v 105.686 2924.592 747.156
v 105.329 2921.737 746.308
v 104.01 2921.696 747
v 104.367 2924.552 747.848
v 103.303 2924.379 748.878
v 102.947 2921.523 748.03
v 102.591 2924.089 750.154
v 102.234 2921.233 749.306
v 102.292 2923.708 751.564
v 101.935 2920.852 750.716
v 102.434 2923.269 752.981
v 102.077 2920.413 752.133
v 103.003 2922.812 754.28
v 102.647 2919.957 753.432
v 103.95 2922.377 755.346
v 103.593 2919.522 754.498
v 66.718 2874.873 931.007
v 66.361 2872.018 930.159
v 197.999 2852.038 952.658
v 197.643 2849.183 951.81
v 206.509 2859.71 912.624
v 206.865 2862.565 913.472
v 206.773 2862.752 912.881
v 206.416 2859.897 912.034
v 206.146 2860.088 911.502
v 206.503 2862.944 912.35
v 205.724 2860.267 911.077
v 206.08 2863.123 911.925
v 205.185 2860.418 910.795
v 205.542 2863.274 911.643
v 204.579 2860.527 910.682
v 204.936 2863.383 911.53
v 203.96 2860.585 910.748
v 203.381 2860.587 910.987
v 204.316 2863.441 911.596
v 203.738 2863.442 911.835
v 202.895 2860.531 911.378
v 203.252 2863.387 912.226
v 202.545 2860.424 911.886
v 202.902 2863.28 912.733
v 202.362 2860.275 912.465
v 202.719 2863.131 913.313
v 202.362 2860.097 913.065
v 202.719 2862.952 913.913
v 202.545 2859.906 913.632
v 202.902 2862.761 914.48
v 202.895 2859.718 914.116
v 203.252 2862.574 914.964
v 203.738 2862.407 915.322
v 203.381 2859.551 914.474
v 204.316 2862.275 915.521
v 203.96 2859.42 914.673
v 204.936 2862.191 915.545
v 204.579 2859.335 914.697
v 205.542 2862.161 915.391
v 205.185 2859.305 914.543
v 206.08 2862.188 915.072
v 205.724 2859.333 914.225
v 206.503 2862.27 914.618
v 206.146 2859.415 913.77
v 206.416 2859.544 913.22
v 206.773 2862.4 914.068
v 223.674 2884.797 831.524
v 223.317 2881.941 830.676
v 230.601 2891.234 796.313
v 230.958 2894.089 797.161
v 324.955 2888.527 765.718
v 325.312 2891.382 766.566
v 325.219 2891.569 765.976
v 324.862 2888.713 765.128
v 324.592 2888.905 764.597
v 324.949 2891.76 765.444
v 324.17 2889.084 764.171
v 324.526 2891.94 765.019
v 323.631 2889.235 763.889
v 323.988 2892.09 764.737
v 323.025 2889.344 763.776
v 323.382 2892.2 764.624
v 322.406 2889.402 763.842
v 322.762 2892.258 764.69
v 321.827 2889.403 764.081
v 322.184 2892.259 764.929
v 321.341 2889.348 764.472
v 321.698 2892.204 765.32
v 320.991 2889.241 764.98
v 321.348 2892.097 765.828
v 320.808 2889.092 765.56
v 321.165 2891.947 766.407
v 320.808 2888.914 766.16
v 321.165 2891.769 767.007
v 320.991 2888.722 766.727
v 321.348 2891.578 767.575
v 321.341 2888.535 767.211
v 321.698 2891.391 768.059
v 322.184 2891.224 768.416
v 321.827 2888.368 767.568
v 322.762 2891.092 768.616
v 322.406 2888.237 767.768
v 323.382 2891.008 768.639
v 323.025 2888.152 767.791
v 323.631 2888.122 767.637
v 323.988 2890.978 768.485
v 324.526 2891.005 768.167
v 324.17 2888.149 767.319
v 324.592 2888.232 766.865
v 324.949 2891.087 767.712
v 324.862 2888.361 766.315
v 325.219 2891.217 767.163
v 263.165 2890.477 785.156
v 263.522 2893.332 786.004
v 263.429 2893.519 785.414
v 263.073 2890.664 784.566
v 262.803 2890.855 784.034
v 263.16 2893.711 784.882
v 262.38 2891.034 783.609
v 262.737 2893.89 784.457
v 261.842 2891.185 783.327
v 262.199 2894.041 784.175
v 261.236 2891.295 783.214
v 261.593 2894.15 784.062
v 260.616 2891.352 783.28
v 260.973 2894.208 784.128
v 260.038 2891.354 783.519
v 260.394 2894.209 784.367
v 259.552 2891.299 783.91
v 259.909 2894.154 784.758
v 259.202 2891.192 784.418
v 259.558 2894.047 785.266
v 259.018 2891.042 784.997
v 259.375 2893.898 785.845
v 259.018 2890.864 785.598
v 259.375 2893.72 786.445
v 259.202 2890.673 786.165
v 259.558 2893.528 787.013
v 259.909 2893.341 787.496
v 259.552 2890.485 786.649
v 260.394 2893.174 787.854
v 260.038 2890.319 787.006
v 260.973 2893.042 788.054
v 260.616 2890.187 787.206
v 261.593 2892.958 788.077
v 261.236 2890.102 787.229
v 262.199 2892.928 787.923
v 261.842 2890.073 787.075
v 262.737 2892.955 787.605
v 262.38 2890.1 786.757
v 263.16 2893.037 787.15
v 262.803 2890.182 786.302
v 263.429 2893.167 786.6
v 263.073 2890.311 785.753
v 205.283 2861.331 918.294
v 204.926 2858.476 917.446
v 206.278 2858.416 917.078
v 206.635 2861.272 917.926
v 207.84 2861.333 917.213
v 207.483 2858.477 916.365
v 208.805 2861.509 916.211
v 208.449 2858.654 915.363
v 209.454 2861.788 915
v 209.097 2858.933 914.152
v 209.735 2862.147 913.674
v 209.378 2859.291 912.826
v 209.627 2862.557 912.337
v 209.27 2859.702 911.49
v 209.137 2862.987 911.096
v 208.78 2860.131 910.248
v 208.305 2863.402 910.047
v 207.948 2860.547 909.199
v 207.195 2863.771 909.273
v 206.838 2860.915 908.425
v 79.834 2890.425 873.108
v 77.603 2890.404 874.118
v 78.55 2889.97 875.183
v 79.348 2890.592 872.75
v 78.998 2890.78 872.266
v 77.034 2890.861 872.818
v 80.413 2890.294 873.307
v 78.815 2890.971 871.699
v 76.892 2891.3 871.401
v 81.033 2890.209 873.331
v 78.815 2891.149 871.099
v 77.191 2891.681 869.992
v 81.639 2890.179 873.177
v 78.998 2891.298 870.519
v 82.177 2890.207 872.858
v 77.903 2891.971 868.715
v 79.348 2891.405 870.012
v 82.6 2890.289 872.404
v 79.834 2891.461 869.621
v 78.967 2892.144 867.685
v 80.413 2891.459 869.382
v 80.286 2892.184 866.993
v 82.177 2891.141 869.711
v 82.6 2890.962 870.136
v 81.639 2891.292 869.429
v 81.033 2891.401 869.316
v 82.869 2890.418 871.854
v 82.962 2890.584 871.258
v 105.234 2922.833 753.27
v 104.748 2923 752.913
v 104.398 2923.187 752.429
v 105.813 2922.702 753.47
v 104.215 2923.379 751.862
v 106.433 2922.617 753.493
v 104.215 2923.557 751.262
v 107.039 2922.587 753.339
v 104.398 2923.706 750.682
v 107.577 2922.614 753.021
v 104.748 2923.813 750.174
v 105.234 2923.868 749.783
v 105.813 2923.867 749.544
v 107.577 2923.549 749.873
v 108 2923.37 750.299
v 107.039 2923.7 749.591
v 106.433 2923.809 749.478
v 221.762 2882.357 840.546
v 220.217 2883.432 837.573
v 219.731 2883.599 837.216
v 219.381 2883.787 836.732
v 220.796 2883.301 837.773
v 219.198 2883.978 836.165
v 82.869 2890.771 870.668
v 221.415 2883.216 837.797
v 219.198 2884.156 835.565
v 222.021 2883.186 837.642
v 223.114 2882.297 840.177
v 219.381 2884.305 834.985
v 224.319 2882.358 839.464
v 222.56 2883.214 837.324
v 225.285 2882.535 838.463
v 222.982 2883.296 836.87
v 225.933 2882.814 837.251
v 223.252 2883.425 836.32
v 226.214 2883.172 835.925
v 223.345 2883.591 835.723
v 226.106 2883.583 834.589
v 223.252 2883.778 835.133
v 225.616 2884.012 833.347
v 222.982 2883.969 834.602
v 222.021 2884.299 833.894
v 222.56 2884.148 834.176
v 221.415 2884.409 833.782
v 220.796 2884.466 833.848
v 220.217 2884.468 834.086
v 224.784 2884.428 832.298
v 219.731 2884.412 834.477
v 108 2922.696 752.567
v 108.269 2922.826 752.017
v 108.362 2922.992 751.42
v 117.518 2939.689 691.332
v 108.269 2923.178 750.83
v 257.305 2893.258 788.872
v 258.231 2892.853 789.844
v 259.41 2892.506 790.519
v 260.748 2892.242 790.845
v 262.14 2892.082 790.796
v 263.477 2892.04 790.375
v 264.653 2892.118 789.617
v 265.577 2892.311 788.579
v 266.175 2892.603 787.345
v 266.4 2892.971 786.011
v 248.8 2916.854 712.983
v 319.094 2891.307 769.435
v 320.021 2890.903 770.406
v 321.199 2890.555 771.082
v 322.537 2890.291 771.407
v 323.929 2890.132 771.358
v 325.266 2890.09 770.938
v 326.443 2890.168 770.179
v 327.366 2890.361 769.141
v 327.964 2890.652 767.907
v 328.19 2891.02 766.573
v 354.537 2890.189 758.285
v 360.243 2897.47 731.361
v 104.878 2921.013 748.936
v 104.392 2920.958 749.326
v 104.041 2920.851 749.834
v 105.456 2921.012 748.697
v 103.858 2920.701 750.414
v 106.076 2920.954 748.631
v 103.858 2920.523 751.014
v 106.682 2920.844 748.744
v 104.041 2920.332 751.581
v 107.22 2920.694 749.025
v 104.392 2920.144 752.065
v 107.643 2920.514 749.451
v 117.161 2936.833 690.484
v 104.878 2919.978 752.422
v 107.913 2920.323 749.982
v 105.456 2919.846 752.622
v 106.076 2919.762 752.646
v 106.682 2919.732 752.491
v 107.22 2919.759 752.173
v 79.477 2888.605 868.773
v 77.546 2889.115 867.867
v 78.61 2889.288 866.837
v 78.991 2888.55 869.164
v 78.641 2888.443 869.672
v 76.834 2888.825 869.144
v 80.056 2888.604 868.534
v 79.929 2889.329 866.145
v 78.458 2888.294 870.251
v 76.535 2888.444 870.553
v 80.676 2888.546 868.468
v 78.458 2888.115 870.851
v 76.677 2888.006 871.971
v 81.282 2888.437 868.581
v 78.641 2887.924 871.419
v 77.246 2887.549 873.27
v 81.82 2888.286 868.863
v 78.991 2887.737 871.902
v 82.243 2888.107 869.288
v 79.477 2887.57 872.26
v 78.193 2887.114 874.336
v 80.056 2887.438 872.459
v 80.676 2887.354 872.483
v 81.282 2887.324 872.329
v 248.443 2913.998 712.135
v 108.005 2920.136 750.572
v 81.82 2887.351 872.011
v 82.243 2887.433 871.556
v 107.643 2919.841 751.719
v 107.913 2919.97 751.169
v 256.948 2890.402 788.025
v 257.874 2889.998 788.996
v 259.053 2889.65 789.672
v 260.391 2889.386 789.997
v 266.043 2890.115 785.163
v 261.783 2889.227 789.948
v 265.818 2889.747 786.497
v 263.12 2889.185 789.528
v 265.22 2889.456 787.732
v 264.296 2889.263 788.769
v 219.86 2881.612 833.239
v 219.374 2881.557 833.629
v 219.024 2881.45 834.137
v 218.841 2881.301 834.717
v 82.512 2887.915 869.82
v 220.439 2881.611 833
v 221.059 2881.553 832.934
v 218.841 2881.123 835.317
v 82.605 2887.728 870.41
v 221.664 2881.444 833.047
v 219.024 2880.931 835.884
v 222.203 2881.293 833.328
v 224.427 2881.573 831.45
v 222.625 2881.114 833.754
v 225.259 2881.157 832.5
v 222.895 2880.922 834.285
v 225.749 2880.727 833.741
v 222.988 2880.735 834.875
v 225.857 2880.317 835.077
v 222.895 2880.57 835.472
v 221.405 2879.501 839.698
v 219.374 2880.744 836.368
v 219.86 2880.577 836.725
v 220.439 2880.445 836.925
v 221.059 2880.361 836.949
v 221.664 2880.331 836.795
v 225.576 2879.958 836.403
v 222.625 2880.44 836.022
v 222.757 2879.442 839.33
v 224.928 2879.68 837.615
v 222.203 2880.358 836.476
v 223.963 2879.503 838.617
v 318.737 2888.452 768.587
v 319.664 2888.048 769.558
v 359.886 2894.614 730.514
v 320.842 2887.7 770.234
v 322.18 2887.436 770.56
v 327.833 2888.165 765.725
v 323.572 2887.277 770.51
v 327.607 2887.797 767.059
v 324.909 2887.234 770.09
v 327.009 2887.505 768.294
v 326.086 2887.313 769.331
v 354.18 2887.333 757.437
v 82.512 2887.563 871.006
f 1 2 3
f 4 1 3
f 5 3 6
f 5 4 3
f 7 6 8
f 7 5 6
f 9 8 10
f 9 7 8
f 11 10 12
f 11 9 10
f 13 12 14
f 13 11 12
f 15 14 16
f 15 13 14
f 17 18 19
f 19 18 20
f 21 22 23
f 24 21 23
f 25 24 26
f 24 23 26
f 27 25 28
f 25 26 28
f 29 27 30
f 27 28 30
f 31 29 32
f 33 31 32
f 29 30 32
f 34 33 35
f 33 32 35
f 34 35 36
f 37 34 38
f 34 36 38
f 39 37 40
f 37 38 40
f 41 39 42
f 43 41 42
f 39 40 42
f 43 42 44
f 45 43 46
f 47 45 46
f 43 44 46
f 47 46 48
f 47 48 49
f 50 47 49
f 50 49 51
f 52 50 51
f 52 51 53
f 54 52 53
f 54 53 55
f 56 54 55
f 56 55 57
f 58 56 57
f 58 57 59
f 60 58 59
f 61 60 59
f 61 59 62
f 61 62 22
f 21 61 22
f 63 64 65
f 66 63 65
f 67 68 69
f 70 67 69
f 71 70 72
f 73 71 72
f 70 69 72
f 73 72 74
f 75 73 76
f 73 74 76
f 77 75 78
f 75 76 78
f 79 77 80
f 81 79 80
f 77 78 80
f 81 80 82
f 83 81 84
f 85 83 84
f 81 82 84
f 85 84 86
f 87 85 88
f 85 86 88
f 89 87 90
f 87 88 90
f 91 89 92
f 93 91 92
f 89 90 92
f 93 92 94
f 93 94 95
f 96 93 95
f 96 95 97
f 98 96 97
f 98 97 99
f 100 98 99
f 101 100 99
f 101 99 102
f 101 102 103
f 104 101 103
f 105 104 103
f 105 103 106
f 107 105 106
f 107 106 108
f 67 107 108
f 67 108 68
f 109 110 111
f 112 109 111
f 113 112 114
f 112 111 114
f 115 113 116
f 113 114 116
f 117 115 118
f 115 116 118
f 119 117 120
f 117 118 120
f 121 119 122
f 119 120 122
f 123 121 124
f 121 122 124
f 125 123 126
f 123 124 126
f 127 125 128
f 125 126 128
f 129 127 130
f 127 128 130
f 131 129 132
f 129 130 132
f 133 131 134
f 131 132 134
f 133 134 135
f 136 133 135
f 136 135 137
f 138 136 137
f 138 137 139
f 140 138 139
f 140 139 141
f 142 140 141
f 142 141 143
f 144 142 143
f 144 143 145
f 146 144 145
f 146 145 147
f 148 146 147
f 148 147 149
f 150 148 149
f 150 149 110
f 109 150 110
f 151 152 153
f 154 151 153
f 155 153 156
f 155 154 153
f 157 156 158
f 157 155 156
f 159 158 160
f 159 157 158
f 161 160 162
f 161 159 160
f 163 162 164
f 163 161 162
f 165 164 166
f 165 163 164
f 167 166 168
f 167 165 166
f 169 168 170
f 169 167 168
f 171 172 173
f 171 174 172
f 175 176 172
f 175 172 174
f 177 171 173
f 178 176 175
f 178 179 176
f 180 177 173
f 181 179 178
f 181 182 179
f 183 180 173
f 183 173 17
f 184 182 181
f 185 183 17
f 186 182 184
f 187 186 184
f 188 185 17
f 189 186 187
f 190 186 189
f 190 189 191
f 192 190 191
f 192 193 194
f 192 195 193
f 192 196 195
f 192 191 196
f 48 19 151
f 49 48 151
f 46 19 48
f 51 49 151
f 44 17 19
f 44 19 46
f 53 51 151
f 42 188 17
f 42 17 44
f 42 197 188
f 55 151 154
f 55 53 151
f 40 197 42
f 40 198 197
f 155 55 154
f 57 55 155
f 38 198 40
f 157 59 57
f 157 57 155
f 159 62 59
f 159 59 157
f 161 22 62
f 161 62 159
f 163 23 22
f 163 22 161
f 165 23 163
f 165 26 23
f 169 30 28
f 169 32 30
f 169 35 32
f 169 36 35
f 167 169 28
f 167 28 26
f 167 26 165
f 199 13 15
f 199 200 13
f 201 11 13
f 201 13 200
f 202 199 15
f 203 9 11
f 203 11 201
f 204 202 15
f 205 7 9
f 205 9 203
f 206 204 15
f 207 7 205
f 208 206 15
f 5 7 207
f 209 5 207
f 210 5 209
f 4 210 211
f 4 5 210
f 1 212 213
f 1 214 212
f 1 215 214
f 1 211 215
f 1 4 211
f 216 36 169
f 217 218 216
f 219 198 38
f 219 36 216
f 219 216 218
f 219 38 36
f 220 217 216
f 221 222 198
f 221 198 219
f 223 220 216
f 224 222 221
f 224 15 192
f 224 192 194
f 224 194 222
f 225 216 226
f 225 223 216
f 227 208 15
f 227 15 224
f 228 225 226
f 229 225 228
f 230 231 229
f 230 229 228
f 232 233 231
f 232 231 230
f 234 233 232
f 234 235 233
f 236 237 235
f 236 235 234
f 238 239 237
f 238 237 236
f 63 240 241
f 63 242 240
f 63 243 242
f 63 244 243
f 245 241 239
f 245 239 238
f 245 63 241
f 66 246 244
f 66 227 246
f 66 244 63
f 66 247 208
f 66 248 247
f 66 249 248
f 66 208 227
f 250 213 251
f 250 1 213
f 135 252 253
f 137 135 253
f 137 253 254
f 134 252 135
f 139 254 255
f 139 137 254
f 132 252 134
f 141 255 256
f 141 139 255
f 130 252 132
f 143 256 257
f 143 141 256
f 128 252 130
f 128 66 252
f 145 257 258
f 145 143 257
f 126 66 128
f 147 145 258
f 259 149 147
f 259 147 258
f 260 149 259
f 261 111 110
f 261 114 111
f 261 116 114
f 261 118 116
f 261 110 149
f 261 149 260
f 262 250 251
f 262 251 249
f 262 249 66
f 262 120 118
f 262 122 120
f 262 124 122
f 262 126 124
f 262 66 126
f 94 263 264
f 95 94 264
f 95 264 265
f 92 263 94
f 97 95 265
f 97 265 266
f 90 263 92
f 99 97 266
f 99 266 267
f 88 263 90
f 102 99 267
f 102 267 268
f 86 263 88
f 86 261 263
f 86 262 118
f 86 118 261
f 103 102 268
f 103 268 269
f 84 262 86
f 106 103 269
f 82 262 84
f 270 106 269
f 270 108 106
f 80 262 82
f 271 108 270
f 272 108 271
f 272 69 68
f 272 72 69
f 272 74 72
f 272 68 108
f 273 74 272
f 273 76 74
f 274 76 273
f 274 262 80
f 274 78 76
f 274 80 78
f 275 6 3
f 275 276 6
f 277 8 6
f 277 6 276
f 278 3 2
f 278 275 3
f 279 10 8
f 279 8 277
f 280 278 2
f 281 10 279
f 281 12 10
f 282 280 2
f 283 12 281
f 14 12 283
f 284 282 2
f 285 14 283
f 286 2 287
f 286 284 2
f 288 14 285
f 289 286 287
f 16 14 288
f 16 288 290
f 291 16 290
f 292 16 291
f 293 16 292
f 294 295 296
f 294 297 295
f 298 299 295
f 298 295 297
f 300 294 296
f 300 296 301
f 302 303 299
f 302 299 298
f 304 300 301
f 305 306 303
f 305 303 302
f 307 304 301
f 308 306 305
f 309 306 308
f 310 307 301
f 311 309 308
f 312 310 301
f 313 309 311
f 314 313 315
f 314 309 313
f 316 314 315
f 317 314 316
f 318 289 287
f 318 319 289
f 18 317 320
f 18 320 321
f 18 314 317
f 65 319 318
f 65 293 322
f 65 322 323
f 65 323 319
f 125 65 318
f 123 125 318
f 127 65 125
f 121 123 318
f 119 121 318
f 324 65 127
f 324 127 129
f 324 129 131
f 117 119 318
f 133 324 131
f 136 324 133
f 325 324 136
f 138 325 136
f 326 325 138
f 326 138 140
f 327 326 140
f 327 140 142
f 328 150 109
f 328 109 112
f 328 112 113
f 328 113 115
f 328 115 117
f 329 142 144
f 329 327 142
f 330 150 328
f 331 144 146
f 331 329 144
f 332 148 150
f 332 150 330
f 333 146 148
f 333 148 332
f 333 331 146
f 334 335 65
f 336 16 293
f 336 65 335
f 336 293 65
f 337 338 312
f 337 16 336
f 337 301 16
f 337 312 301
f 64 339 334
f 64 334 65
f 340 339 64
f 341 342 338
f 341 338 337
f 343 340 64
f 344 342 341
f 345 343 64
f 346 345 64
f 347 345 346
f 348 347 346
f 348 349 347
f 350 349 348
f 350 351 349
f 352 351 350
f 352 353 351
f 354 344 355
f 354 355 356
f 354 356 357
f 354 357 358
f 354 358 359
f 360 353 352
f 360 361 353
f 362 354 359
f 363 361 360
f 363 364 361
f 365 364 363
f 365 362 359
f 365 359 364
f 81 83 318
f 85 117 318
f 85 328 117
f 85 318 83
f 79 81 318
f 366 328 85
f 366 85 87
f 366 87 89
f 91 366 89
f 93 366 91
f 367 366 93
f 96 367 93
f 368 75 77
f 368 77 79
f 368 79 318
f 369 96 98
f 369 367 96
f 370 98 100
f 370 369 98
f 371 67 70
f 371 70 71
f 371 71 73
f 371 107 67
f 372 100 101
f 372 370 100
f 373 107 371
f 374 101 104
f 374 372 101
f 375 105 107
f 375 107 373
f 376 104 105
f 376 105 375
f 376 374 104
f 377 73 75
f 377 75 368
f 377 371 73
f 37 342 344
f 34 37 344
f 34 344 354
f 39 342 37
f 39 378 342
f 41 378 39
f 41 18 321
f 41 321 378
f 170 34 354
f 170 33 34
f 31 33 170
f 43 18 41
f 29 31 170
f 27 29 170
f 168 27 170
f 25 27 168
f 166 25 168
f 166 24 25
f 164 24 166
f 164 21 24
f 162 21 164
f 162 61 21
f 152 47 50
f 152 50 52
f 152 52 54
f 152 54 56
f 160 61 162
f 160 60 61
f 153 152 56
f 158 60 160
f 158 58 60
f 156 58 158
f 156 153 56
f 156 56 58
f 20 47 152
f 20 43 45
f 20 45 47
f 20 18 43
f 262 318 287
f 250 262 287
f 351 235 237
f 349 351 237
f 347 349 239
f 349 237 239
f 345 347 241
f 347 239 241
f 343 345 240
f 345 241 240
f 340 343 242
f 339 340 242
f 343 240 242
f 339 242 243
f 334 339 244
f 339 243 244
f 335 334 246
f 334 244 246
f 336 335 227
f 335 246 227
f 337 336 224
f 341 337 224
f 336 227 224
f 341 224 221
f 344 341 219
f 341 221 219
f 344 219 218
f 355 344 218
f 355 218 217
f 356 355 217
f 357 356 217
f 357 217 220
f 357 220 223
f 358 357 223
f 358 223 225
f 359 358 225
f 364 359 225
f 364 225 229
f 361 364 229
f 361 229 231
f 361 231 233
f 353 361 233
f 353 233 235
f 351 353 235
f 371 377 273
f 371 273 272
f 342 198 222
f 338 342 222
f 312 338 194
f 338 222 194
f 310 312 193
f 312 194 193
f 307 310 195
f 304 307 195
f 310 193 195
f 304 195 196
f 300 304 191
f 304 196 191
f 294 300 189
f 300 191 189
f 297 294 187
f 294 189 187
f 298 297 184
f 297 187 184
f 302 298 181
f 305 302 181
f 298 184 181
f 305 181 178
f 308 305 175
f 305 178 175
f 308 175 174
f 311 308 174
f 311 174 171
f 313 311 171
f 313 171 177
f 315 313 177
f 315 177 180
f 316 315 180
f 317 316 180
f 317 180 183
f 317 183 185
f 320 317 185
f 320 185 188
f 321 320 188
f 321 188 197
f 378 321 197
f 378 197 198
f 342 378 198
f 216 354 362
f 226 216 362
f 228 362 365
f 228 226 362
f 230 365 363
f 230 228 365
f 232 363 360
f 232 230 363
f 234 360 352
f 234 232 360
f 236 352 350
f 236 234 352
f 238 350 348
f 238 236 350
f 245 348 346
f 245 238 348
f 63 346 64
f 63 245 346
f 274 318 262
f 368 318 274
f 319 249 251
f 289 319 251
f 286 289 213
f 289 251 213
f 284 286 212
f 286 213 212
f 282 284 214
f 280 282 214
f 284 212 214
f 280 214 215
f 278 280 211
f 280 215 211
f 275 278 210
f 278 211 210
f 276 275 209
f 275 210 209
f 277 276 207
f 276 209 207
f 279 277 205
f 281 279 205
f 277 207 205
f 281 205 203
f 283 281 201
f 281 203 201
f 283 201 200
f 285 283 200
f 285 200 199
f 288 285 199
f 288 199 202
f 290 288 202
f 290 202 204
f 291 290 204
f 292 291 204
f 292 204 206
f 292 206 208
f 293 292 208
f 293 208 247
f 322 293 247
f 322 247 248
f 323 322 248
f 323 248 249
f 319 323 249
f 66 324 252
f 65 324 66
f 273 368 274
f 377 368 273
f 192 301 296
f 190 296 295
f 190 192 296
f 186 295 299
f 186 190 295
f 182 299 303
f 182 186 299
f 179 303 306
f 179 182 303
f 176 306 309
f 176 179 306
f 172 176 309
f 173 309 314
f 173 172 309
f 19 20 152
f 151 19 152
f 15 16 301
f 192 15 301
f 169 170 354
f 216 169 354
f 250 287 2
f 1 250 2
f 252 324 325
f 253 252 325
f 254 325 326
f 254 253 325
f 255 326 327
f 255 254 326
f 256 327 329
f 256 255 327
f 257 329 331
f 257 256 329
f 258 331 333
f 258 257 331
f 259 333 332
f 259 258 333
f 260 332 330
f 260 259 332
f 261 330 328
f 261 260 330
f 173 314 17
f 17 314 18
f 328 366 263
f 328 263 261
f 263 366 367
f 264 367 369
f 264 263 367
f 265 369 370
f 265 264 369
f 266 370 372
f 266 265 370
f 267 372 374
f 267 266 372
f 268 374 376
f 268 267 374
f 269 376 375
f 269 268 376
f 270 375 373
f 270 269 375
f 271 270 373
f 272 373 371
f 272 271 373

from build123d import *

# Parameters (mm, degrees)
BOSS_EXTRUDE1_DEPTH     = 3
CUT_EXTRUDE2_DEPTH      = 80
BOSS_EXTRUDE2_DEPTH     = 3
SKETCH6_R               = 4.999999998
BOSS_EXTRUDE3_DEPTH     = 3
SKETCH7_R               = 2.099999998
CUT_EXTRUDE8_DEPTH      = 103.727128927
CUT_EXTRUDE8_DEPTH_BACK = 93.470854005


with BuildPart() as part:
    # Sketch1 → Boss-Extrude1 (new body)
    with BuildSketch(Plane(origin=(349.089252495, 2874.058311474, 804.288278977), x_dir=(0.935705749, -0.202672232, 0.288753733), z_dir=(-0.118950757, -0.951829224, -0.282616075))):
        Polygon((-227.79105078, 209.509165447), (-94.070562084, 190.966487567), (-128.879732086, -60.059780262), (-262.600220782, -41.517102382), align=None)
    extrude(amount=-BOSS_EXTRUDE1_DEPTH)

    # Sketch3 → Cut-Extrude2 (cut)
    with BuildSketch(Plane(origin=(688.574610071, 446.833813903, 894.692140277), x_dir=(0.516756682, 0.537673014, -0.66623589), z_dir=(0.567103814, 0.368008283, 0.736860345))):
        Polygon((970.937778761, -219.886702224), (970.937778761, 845.245168422), (-1124.286512281, 775.631358808), (-1124.286512281, -289.500511838), align=None)
    extrude(amount=CUT_EXTRUDE2_DEPTH, mode=Mode.SUBTRACT)

    # Sketch4 → Boss-Extrude2 (add)
    with BuildSketch(Plane(origin=(357.380640452, 2859.715621096, 849.10358184), x_dir=(0.992857215, -0.11667261, -0.024940964), z_dir=(-0.118950757, -0.951829224, -0.282616075))):
        Polygon((-128.234790436, -58.388271423), (-111.076725557, -145.727367265), (1.37386057, -123.636064008), (-4.113952819, -95.701639995), align=None)
    extrude(amount=-BOSS_EXTRUDE2_DEPTH)

    # Sketch6 → Boss-Extrude3 (add)
    with BuildSketch(Plane(origin=(357.737492723, 2862.571108769, 849.951430064), x_dir=(0.992900155, -0.114030405, -0.033857781), z_dir=(0.118950757, 0.951829224, 0.282616075))):
        with Locations((-252.279251986, 111.451515819)):
            Circle(SKETCH6_R)
        with Locations((-137.453856598, 19.622629821)):
            Circle(SKETCH6_R)
        with Locations((-154.05088047, -60.894440309)):
            Circle(SKETCH6_R)
        with Locations((-96.98907211, 70.058139701)):
            Circle(SKETCH6_R)
        with Locations((-34.757829169, 88.136852409)):
            Circle(SKETCH6_R)
        with Locations((-277.861066086, -12.653428287)):
            Circle(SKETCH6_R)
    extrude(amount=-BOSS_EXTRUDE3_DEPTH)

    # Sketch7 → Cut-Extrude8 (cut, two sides)
    with BuildSketch(Plane(origin=(357.737492723, 2862.571108769, 849.951430064), x_dir=(0.992900155, -0.114030405, -0.033857781), z_dir=(0.118950757, 0.951829224, 0.282616075))) as cut_extrude8_sk:
        with Locations((-253.258660999, 111.653401888)):
            Circle(SKETCH7_R)
        with Locations((-278.8404751, -12.451542218)):
            Circle(SKETCH7_R)
        with Locations((-34.757829169, 88.136852409)):
            Circle(SKETCH7_R)
        with Locations((-96.98907211, 70.058139701)):
            Circle(SKETCH7_R)
        with Locations((-137.453856598, 19.622629821)):
            Circle(SKETCH7_R)
        with Locations((-154.05088047, -60.894440309)):
            Circle(SKETCH7_R)
    extrude(amount=CUT_EXTRUDE8_DEPTH, mode=Mode.SUBTRACT)
    extrude(cut_extrude8_sk.sketch, amount=-CUT_EXTRUDE8_DEPTH_BACK, mode=Mode.SUBTRACT)


solid = part.part
